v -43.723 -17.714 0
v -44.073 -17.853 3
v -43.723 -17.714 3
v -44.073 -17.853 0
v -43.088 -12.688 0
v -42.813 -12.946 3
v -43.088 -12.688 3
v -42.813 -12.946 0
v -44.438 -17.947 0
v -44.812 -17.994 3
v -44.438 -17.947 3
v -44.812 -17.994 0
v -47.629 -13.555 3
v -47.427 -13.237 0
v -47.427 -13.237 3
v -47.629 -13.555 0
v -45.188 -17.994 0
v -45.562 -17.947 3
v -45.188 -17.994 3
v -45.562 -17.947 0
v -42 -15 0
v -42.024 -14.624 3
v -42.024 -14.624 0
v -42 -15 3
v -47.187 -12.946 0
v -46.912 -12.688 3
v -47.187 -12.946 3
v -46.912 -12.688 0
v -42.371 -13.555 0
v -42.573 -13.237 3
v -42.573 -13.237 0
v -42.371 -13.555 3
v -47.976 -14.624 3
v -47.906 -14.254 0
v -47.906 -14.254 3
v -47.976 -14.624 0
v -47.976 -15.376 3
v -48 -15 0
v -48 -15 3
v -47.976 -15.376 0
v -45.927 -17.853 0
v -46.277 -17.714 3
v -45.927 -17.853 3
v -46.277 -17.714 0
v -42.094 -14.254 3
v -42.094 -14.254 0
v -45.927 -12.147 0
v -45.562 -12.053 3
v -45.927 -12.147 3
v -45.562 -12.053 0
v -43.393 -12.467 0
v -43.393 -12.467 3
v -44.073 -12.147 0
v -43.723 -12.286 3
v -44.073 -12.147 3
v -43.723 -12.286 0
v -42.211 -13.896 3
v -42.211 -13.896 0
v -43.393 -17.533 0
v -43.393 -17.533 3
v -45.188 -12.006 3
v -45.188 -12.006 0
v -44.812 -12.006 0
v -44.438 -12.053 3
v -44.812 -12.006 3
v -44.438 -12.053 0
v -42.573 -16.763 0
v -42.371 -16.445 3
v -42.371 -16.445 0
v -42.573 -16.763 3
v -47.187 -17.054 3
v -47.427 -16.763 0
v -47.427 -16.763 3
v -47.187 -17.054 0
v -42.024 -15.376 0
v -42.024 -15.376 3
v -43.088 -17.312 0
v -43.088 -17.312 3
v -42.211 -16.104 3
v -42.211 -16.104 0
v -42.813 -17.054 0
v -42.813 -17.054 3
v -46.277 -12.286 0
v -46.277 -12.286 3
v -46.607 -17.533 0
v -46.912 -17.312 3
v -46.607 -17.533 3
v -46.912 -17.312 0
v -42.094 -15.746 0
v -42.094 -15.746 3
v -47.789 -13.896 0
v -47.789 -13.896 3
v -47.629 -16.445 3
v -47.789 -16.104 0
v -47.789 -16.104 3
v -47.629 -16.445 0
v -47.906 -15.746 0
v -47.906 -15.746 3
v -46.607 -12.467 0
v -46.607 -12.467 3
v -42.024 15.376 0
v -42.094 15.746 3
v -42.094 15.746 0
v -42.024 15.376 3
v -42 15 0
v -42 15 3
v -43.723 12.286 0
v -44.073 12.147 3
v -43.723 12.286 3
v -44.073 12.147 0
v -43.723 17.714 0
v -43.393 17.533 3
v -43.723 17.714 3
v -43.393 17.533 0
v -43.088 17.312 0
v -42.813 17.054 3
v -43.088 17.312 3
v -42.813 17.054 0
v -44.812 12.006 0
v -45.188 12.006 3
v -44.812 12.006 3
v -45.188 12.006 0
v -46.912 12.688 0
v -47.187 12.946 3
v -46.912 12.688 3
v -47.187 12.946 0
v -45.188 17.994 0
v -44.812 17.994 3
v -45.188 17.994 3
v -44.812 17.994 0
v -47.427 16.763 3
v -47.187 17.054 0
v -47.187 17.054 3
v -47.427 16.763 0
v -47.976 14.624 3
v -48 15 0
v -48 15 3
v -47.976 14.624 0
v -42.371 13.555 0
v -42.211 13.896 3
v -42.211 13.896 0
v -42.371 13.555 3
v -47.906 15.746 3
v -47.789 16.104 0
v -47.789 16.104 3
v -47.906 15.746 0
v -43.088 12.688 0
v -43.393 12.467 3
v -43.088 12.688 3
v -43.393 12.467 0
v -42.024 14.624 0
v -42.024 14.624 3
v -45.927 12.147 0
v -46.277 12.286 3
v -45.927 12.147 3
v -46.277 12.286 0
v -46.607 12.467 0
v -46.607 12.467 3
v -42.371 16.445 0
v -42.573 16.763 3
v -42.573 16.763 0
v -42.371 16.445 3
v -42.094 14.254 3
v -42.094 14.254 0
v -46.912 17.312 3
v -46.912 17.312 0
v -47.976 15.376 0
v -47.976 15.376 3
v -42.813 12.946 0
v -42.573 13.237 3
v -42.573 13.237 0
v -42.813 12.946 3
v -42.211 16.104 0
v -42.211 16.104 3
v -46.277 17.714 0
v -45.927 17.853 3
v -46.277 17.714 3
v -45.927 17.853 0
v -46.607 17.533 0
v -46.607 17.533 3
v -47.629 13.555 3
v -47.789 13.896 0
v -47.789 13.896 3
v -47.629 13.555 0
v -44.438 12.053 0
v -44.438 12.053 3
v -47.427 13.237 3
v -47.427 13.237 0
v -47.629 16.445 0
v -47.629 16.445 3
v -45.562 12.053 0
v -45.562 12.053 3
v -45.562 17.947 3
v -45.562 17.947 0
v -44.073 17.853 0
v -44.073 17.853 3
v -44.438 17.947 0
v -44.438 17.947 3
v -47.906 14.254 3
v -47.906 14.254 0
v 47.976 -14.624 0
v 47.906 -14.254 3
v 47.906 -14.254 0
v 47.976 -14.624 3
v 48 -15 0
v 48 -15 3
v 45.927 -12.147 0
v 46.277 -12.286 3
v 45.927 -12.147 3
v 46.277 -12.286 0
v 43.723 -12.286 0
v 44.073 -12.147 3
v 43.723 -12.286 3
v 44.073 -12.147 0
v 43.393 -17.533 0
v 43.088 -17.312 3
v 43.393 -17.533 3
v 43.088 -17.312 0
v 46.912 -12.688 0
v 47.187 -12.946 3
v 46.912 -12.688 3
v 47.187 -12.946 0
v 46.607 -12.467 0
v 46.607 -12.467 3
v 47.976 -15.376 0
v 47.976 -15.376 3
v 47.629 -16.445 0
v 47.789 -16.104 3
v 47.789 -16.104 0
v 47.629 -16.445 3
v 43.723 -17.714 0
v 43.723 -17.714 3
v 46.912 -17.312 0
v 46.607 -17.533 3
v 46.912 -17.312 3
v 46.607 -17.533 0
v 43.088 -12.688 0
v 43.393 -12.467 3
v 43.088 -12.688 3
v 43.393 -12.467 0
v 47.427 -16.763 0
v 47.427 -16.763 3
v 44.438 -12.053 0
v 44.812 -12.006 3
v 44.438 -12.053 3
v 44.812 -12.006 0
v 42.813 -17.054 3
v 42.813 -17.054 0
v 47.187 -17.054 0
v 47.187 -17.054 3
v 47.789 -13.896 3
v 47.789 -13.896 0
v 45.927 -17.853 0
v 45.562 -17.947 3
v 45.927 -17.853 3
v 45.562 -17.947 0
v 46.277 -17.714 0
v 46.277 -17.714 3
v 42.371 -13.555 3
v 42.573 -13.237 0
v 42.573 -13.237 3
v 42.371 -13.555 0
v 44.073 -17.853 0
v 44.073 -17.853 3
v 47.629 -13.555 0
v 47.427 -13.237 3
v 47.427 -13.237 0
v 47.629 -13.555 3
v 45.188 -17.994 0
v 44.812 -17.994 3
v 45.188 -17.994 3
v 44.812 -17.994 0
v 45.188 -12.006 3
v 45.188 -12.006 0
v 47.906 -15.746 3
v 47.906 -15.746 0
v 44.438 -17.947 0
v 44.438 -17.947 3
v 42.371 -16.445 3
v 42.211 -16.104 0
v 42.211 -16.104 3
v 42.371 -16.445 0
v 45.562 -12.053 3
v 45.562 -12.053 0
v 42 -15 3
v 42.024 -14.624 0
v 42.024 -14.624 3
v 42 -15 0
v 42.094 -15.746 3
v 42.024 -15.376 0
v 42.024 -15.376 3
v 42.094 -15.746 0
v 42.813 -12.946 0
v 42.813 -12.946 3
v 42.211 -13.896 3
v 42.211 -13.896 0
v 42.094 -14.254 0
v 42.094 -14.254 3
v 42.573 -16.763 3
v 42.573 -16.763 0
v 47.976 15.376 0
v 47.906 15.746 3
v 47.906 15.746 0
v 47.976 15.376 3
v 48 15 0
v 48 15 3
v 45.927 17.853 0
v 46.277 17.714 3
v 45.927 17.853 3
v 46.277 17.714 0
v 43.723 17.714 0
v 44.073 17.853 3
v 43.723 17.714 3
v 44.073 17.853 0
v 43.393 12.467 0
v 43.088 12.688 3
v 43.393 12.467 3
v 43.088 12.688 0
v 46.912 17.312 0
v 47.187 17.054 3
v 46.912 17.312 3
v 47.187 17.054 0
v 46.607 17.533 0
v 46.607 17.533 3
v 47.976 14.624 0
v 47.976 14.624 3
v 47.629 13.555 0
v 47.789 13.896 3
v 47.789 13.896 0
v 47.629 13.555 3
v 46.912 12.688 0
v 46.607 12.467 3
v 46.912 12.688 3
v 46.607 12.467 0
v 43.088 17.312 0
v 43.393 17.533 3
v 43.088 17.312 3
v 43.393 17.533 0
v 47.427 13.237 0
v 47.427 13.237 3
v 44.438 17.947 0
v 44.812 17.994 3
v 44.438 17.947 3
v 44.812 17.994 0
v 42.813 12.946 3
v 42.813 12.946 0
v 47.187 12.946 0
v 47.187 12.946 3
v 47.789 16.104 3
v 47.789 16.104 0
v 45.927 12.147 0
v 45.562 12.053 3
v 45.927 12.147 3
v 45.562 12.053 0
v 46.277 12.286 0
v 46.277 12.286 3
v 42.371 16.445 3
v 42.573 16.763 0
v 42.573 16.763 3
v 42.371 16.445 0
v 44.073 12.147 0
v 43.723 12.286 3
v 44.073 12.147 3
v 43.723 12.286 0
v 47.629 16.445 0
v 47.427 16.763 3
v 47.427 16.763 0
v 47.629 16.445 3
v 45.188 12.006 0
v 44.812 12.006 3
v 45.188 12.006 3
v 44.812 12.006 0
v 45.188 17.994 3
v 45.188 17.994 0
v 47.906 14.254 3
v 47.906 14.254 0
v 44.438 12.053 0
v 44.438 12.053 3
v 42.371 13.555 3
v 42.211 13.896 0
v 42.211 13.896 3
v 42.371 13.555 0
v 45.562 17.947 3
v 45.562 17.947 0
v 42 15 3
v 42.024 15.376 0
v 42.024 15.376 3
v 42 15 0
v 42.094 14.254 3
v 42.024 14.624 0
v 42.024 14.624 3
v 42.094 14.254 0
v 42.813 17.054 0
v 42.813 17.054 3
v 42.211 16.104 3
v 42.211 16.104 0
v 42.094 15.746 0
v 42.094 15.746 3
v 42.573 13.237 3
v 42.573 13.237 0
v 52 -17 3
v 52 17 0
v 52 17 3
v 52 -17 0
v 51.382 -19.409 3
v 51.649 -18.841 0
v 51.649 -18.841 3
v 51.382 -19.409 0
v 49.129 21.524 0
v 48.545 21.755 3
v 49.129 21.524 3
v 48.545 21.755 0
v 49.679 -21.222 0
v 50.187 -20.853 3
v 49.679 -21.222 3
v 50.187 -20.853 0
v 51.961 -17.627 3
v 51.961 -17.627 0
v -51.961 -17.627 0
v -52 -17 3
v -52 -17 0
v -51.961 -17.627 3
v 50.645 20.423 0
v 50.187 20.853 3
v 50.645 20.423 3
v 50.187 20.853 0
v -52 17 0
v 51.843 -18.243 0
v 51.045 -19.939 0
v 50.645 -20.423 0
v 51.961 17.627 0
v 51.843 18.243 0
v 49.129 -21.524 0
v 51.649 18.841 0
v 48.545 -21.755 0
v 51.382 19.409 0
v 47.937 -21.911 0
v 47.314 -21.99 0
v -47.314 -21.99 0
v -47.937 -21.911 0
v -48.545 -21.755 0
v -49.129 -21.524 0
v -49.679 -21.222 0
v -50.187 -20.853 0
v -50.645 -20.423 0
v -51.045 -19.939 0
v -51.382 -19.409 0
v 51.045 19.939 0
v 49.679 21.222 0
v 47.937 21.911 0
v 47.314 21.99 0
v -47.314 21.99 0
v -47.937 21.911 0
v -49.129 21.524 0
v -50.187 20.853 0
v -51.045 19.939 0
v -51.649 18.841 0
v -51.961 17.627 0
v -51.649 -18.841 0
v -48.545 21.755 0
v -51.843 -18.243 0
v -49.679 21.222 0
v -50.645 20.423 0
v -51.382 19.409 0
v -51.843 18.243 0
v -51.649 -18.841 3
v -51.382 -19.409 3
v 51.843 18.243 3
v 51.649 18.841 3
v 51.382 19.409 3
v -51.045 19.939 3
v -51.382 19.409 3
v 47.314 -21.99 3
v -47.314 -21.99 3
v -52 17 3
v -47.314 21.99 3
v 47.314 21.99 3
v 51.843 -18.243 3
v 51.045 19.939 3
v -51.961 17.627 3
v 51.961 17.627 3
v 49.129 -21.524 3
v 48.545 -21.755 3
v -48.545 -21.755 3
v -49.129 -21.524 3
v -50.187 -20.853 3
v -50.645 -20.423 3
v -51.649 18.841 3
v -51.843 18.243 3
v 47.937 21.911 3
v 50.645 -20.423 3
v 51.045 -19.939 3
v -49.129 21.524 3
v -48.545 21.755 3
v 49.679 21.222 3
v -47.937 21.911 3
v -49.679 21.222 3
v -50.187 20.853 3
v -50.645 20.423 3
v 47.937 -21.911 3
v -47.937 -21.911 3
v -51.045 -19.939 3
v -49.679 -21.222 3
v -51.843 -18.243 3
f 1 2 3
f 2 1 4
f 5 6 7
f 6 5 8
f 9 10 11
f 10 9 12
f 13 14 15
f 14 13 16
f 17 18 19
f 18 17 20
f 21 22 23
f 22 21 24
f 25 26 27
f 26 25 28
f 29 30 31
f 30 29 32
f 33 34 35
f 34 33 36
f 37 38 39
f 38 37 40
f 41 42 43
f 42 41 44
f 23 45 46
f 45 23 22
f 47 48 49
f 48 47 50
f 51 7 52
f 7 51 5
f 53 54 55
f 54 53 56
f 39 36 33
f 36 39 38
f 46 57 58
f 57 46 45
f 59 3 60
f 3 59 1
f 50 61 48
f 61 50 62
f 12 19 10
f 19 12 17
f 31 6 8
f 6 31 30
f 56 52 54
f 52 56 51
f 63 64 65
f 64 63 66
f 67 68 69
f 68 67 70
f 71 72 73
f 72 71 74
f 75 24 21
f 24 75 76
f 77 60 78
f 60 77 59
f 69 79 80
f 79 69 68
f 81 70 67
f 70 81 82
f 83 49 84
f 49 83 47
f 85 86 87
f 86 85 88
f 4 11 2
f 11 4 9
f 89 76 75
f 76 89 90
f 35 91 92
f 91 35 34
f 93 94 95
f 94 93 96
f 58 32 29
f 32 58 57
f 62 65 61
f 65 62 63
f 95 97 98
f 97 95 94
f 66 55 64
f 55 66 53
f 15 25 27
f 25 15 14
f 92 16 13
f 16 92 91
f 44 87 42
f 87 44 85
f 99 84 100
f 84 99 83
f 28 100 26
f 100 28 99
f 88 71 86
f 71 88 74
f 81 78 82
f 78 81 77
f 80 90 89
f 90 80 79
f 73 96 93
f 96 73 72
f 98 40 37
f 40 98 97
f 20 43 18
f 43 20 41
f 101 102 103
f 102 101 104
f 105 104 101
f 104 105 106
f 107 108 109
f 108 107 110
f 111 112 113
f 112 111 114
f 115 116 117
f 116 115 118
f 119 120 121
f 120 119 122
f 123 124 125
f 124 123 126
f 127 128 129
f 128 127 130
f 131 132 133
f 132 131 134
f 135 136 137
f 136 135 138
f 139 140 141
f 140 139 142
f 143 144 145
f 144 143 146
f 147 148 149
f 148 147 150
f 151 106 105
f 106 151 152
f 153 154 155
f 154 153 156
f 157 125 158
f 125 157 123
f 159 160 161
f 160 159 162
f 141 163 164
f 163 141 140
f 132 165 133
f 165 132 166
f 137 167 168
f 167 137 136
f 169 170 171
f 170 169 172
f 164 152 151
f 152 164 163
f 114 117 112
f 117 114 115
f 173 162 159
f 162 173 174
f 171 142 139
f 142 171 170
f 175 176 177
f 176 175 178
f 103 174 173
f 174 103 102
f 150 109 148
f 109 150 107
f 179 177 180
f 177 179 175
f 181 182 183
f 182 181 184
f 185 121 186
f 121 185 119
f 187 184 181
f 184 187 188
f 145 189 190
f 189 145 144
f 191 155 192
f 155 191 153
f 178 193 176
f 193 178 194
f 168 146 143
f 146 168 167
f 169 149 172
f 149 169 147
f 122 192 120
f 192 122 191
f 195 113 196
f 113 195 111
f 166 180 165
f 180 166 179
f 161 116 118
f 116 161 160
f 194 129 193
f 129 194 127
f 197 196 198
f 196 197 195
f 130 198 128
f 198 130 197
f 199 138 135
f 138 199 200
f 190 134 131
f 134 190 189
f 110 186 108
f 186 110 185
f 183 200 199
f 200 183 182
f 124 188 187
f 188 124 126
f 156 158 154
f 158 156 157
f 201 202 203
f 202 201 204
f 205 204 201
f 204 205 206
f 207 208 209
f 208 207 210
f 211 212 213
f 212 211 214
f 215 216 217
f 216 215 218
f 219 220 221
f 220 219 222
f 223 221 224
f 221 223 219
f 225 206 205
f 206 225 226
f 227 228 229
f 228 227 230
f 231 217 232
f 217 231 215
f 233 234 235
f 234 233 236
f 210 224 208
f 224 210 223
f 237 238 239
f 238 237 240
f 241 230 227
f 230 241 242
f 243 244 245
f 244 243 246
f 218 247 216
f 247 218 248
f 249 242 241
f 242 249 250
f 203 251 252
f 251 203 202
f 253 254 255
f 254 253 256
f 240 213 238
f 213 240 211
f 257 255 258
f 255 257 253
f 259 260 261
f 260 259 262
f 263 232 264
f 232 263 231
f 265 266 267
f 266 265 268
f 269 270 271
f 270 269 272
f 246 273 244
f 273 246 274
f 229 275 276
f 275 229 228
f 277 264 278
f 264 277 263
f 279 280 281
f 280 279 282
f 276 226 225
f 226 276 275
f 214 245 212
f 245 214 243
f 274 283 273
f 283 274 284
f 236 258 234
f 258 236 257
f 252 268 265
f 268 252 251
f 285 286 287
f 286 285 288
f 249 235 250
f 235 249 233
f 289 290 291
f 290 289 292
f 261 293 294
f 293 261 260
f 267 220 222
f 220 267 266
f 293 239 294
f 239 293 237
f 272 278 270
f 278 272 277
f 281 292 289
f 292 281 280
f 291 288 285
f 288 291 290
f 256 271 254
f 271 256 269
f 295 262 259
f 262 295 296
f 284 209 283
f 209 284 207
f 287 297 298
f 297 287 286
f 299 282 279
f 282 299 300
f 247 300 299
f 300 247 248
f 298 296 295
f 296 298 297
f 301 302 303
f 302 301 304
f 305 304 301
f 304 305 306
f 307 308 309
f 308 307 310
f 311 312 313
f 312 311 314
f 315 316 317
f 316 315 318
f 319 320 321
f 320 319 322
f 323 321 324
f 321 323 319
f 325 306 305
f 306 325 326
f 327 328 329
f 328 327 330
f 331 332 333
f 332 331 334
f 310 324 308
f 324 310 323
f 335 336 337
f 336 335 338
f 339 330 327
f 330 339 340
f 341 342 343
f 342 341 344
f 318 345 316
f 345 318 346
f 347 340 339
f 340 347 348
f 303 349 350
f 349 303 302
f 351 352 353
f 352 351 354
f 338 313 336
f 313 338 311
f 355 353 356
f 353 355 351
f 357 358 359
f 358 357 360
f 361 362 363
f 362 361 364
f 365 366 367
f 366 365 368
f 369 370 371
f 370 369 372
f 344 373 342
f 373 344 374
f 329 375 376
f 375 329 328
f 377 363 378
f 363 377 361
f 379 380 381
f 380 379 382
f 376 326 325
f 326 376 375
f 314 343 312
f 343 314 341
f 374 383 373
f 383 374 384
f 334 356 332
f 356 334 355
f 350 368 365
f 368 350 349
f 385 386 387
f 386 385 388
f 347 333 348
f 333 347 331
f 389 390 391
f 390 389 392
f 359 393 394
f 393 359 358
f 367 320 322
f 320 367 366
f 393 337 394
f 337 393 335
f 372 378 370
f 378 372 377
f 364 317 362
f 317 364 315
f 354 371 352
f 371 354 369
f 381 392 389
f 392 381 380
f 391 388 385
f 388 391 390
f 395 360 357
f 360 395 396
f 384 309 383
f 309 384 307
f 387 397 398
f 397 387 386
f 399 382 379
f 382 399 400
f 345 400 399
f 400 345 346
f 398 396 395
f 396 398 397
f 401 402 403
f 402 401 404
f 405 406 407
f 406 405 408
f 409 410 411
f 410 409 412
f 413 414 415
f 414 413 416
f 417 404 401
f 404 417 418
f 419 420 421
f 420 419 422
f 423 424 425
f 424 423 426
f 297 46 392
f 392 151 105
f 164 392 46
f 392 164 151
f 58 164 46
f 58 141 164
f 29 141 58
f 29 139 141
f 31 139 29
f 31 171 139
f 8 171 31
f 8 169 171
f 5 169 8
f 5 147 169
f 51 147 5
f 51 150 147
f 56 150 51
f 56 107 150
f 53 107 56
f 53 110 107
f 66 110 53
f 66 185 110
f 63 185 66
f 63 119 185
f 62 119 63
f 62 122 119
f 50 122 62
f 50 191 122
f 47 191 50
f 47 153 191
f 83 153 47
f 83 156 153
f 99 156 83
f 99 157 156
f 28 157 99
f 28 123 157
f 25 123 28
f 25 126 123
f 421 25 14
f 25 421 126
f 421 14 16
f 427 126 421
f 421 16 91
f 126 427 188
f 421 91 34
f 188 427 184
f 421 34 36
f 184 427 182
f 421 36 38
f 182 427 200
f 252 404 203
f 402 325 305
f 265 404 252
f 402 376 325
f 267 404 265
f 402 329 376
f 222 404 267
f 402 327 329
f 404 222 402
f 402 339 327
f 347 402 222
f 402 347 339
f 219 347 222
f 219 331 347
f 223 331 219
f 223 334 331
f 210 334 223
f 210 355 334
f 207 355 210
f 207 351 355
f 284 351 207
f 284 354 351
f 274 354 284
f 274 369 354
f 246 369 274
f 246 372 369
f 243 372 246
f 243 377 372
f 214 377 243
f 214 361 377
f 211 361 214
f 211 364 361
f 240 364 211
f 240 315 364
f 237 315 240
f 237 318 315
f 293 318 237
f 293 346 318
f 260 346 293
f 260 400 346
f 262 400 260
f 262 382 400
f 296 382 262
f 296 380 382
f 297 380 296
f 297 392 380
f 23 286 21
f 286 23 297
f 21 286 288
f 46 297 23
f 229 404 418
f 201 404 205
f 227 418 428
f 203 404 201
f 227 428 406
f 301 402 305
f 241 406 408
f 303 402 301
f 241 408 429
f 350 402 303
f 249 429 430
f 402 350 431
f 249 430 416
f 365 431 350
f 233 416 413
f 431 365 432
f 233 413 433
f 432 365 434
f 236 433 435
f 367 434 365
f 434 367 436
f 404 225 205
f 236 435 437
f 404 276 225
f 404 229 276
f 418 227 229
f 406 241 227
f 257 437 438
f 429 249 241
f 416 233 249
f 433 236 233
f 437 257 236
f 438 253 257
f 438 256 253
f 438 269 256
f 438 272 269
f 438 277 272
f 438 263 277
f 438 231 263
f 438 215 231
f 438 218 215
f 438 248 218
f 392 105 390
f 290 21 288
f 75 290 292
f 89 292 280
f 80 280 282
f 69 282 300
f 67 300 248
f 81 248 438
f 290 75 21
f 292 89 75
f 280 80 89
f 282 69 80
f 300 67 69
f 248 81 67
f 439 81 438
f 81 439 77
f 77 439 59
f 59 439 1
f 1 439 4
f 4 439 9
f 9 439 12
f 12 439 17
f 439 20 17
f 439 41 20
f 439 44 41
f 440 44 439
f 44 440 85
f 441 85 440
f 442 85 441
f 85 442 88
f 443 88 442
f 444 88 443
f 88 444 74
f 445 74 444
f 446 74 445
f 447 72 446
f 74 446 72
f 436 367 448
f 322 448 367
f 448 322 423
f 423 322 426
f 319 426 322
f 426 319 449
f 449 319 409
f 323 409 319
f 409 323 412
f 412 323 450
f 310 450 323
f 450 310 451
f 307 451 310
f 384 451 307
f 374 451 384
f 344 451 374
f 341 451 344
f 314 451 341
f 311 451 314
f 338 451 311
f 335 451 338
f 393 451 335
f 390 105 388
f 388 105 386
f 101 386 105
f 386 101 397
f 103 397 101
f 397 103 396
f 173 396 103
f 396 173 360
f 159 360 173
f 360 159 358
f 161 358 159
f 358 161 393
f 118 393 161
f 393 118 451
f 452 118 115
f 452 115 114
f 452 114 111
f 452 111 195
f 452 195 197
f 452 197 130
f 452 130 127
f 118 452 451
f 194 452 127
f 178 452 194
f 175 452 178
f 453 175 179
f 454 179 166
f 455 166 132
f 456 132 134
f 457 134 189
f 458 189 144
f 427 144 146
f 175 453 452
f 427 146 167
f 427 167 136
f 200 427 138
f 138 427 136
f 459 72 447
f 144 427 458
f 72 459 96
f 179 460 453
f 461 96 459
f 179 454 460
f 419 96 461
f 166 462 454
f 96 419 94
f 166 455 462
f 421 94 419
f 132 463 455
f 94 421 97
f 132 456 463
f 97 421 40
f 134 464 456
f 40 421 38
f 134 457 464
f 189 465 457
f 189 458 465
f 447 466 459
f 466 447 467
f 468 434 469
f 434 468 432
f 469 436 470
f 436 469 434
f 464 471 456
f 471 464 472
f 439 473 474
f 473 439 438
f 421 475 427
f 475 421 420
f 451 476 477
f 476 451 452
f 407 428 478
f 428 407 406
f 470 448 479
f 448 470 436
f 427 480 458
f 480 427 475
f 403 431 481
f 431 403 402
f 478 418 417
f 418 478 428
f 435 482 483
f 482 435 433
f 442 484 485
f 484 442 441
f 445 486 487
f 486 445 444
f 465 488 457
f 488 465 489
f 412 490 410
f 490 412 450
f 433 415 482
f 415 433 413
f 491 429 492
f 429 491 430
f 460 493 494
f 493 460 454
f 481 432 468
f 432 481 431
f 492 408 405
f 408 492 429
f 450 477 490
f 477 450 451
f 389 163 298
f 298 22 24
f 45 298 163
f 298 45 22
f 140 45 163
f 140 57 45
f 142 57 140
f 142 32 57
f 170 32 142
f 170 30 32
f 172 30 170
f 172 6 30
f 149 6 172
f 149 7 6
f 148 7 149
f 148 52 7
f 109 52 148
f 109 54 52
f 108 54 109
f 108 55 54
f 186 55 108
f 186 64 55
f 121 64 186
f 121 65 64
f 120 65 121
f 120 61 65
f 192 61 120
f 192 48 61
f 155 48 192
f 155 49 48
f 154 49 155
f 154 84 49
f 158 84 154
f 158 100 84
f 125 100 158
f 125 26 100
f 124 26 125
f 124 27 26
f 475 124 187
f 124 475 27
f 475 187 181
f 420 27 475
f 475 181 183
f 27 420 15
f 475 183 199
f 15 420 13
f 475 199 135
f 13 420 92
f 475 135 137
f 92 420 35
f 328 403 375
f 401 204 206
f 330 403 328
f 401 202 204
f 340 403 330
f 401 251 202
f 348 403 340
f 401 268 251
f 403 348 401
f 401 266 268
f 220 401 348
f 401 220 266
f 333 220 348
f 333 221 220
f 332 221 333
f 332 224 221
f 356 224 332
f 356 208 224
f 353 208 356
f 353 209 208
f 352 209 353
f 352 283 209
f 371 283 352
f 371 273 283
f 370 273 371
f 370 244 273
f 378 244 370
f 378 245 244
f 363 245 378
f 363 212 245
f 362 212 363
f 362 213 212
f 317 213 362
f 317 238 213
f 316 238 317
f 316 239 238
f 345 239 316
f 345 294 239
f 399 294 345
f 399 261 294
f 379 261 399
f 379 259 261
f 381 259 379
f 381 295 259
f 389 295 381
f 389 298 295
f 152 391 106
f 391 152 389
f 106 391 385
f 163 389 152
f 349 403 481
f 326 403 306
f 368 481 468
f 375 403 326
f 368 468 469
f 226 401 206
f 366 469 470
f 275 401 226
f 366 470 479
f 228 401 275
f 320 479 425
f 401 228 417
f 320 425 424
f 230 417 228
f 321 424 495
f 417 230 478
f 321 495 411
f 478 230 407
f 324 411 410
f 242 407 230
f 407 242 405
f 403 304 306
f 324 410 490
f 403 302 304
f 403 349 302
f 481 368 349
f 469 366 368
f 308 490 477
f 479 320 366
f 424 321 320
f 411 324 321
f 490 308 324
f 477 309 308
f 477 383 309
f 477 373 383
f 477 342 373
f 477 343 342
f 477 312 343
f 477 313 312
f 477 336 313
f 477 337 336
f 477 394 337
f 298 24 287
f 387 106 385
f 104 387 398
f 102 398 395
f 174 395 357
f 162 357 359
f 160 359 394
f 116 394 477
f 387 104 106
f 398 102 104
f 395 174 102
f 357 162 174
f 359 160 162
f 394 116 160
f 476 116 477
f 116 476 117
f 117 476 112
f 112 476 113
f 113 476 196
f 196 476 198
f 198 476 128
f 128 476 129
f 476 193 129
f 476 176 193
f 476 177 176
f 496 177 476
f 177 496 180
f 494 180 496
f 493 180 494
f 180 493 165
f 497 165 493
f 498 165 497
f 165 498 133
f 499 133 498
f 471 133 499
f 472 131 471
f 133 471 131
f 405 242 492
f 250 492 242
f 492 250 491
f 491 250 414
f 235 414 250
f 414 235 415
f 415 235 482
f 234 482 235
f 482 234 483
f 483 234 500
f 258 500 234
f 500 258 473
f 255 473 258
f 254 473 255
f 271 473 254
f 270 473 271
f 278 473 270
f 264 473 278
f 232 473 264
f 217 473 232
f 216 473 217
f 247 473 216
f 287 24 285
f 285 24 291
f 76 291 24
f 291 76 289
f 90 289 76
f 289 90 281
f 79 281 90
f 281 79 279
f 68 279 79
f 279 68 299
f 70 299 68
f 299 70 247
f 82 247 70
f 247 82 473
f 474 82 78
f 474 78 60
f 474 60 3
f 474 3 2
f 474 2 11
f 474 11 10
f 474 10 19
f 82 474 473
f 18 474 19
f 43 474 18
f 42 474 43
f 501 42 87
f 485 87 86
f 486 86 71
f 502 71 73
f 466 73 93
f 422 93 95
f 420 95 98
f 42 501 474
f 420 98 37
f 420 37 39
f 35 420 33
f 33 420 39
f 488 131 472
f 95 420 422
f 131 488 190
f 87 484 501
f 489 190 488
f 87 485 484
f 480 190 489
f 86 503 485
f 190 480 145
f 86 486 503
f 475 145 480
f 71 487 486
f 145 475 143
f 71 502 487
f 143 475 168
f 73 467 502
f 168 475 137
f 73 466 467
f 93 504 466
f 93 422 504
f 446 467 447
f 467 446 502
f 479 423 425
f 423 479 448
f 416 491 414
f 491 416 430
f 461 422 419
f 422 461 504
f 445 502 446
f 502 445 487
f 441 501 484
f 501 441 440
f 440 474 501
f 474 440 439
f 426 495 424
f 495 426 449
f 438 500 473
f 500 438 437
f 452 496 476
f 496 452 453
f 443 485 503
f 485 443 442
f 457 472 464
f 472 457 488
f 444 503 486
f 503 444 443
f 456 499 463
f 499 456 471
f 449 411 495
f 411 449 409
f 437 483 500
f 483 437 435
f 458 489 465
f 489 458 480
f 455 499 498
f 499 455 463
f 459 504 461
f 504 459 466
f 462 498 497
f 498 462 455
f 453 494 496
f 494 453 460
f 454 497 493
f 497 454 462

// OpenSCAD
$fn = 50;


difference() {
	union() {
		hull() {
			translate(v = [-47.0000000000, 17.0000000000, 0]) {
				cylinder(h = 3, r = 5);
			}
			translate(v = [47.0000000000, 17.0000000000, 0]) {
				cylinder(h = 3, r = 5);
			}
			translate(v = [-47.0000000000, -17.0000000000, 0]) {
				cylinder(h = 3, r = 5);
			}
			translate(v = [47.0000000000, -17.0000000000, 0]) {
				cylinder(h = 3, r = 5);
			}
		}
	}
	union() {
		translate(v = [-45.0000000000, -15.0000000000, -100.0000000000]) {
			cylinder(h = 200, r = 3.0000000000);
		}
		translate(v = [-45.0000000000, 15.0000000000, -100.0000000000]) {
			cylinder(h = 200, r = 3.0000000000);
		}
		translate(v = [45.0000000000, -15.0000000000, -100.0000000000]) {
			cylinder(h = 200, r = 3.0000000000);
		}
		translate(v = [45.0000000000, 15.0000000000, -100.0000000000]) {
			cylinder(h = 200, r = 3.0000000000);
		}
	}
}
